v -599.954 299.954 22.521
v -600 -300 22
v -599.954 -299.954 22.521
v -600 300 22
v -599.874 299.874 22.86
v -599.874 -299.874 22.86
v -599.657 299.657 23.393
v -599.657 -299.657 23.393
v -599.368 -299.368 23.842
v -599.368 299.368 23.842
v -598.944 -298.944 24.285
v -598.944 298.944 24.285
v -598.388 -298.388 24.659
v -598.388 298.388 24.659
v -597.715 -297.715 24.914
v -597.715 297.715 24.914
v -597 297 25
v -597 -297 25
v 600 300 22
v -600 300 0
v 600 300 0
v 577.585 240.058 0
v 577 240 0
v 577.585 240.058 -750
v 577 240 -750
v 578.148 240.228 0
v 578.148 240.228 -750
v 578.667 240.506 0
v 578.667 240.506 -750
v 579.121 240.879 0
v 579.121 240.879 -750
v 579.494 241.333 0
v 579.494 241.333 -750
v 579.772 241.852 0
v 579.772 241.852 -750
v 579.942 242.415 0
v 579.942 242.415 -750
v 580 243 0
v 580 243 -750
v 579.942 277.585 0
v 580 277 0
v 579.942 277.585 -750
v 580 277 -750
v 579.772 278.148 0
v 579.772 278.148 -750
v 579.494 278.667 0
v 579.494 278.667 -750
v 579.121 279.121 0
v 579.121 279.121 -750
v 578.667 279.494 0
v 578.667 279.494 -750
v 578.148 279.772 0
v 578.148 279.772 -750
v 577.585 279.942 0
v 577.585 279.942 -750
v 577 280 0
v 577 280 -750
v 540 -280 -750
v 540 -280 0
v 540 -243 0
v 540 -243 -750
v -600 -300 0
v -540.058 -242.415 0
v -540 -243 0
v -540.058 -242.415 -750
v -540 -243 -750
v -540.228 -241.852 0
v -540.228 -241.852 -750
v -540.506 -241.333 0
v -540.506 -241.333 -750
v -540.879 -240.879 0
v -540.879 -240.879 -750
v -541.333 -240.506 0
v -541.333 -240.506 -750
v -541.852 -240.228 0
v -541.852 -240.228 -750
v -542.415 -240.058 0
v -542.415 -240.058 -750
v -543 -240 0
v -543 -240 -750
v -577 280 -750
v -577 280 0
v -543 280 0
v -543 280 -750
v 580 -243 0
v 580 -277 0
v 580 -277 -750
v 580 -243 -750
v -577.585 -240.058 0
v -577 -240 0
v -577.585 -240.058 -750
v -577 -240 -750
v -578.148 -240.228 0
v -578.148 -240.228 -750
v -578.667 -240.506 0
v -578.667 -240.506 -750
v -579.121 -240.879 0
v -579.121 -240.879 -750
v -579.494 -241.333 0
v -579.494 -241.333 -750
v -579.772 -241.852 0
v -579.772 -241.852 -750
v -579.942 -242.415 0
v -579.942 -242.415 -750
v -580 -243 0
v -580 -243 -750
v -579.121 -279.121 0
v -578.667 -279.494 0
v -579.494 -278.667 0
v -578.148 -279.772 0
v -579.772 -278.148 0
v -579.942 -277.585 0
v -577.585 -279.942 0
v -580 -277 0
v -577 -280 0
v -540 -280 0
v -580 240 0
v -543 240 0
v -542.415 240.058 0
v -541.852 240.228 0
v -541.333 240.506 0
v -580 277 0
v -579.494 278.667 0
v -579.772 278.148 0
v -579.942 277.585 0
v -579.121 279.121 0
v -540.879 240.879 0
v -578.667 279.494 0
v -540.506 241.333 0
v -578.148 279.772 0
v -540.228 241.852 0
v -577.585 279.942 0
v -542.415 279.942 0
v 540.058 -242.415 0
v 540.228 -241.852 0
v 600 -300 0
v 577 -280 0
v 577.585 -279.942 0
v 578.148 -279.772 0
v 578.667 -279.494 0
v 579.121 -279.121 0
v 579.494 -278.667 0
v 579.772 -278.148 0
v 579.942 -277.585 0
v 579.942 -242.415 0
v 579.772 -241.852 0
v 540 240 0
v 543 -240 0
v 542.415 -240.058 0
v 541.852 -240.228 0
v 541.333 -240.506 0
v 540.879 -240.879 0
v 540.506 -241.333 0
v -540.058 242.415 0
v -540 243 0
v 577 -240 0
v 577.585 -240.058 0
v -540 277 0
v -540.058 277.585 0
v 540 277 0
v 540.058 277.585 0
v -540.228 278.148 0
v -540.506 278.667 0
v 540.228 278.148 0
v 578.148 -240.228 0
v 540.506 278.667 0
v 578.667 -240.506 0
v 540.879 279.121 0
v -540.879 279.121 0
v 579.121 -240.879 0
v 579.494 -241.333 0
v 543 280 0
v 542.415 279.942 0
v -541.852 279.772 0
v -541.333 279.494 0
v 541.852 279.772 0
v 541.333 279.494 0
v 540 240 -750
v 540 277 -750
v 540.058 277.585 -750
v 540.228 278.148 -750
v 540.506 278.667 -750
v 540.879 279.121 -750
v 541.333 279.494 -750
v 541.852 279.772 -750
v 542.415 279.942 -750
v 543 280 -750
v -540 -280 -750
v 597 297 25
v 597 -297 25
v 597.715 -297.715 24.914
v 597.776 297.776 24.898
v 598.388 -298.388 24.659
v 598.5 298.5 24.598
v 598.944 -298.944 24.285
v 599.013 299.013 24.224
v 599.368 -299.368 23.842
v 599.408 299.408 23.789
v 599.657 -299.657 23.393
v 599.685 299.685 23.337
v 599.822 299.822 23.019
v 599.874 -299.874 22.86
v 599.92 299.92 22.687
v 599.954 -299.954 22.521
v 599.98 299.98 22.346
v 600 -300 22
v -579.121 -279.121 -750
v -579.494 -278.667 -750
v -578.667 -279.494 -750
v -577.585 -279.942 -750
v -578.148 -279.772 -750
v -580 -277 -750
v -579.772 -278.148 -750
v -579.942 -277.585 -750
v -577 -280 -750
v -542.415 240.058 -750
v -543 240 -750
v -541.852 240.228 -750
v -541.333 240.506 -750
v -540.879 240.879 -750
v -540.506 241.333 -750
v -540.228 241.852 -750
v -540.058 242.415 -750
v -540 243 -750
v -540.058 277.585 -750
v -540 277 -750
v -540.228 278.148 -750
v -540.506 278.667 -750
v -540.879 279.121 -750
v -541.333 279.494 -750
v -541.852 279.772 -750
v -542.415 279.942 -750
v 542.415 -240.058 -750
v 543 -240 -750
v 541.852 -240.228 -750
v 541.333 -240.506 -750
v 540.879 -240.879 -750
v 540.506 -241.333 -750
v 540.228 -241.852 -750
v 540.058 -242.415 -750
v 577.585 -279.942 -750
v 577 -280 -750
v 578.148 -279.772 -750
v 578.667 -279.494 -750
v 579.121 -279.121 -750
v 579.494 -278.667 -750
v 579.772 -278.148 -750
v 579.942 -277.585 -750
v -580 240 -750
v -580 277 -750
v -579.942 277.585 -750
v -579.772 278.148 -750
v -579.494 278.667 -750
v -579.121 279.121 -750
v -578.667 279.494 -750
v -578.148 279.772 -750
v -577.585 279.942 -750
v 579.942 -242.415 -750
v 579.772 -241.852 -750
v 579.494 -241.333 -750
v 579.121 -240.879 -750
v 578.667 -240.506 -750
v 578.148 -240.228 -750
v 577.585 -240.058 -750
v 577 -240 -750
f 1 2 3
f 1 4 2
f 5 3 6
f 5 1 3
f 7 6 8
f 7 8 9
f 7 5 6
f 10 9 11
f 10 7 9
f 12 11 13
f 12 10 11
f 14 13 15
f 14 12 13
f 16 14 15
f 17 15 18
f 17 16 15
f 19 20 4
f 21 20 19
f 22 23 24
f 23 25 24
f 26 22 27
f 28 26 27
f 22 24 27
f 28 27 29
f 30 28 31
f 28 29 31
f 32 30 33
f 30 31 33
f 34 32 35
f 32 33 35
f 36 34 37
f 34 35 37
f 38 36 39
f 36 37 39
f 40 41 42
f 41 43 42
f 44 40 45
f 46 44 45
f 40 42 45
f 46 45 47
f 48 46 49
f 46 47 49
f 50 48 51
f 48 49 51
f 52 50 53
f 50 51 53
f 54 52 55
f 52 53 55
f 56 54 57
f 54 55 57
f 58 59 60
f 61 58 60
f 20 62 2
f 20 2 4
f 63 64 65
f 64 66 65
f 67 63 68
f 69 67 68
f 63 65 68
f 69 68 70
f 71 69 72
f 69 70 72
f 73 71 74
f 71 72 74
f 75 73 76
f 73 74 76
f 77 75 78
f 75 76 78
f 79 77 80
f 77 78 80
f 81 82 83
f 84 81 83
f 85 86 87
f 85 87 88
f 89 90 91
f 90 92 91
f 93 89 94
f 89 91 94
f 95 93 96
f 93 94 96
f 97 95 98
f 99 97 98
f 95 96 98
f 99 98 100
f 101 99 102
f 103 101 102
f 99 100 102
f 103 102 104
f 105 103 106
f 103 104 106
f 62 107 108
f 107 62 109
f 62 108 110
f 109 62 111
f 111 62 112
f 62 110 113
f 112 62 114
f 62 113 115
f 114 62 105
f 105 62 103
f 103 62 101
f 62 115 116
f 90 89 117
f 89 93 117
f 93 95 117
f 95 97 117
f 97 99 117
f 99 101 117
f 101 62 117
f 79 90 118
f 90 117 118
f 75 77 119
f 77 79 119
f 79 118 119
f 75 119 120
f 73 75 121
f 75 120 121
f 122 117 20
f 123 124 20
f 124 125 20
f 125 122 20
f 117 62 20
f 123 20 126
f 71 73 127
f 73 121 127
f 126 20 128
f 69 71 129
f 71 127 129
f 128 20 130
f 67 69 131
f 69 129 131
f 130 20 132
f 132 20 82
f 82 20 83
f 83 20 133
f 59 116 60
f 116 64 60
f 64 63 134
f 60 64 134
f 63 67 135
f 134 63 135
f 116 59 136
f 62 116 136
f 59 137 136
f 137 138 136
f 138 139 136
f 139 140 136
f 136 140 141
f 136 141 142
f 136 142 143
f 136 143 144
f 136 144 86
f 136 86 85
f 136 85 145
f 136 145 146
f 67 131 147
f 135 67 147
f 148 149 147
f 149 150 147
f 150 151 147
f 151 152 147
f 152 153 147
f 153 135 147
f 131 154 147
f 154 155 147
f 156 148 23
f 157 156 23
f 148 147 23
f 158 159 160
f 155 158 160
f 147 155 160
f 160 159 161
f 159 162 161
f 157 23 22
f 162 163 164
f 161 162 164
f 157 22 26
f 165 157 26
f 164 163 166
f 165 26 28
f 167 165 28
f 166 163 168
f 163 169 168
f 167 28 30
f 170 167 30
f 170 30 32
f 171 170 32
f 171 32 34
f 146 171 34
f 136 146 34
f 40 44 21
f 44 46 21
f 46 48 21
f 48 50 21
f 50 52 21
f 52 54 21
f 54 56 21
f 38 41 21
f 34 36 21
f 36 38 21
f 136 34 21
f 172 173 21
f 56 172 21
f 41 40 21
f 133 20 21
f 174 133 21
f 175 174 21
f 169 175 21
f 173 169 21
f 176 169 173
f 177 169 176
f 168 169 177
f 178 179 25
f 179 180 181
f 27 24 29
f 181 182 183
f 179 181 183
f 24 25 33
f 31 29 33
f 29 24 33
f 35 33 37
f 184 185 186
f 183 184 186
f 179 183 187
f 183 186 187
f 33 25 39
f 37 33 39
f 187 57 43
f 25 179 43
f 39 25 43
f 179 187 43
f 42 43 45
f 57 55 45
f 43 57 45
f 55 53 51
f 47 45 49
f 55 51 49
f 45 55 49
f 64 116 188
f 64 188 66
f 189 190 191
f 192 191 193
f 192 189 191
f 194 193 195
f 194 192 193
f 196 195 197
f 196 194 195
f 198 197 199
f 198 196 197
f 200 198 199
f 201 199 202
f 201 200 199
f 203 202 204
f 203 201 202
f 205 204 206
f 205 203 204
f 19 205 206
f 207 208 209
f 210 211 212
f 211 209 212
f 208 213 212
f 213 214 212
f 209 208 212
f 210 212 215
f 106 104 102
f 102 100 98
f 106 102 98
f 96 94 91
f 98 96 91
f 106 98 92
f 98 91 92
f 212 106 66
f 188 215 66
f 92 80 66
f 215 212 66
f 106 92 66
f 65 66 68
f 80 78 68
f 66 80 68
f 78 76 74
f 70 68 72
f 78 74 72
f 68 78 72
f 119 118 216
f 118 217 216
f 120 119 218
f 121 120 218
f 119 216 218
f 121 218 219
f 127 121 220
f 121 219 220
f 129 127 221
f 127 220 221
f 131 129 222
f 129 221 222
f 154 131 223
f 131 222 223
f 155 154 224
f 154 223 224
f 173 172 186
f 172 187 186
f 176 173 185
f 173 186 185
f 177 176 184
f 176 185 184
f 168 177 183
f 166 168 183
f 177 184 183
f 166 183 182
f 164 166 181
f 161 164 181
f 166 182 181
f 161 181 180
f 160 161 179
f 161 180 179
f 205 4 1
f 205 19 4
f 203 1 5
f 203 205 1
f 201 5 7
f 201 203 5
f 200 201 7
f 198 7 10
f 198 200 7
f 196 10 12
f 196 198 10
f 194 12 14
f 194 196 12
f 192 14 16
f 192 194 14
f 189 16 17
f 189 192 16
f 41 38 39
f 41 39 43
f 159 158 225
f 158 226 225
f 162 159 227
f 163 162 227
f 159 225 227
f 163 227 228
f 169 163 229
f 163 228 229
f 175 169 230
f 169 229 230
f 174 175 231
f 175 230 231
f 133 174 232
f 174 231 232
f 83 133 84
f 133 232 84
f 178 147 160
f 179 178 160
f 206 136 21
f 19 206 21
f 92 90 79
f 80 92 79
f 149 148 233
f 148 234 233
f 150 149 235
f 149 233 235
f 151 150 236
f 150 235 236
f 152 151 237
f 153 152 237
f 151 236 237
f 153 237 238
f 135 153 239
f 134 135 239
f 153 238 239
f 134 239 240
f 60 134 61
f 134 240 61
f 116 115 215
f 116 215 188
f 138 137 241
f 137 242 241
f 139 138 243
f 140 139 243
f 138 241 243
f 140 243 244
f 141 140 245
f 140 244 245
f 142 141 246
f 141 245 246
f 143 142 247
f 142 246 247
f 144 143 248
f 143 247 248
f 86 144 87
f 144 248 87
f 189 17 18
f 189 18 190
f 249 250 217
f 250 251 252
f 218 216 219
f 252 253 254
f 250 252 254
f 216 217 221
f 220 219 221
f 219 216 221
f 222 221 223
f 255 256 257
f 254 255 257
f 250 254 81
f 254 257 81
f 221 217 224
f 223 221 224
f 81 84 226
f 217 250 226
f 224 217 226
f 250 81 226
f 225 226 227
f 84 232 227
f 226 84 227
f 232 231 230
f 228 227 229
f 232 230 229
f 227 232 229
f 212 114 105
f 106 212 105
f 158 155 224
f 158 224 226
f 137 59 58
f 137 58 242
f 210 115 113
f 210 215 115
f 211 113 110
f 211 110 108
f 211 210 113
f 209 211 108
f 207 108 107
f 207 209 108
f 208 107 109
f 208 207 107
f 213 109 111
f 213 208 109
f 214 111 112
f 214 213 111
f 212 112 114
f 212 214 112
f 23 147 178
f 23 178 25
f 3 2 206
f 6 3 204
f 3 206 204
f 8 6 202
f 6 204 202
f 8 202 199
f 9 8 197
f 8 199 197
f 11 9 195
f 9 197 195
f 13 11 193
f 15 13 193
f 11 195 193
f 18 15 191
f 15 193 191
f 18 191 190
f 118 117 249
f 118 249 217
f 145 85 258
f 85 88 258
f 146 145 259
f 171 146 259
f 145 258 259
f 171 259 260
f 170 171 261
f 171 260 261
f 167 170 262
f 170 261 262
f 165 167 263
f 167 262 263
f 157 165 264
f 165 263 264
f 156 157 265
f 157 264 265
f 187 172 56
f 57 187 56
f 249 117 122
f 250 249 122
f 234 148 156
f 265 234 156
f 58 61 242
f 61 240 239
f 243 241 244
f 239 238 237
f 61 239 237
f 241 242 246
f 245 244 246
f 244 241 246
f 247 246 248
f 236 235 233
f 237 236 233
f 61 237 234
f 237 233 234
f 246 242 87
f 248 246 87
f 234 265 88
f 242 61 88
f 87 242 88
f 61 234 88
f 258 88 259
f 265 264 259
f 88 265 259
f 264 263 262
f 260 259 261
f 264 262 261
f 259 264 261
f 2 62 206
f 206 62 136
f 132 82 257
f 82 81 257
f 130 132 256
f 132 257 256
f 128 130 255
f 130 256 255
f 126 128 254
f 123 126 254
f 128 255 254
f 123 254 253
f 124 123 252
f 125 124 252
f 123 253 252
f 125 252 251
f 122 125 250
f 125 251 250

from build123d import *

# Parameters (mm, degrees)
SKETCH1_W           = 1200
SKETCH1_H           = 600
BOSS_EXTRUDE1_DEPTH = 25
SKETCH2_W           = 40
SKETCH2_H           = 40
BOSS_EXTRUDE2_DEPTH = 750
FILLET1_R           = 3


with BuildPart() as part:
    # Sketch1 → Boss-Extrude1 (new body)
    with BuildSketch(Plane.XY):
        Rectangle(SKETCH1_W, SKETCH1_H)
    extrude(amount=BOSS_EXTRUDE1_DEPTH)

    # Sketch2 → Boss-Extrude2 (add)
    with BuildSketch(Plane.XY):
        with Locations((-560, 260)):
            Rectangle(SKETCH2_W, SKETCH2_H)
        with Locations((560, 260)):
            Rectangle(SKETCH2_W, SKETCH2_H)
        with Locations((-560, -260)):
            Rectangle(SKETCH2_W, SKETCH2_H)
        with Locations((560, -260)):
            Rectangle(SKETCH2_W, SKETCH2_H)
    extrude(amount=-BOSS_EXTRUDE2_DEPTH)

    # Fillet1
    fillet1_edges = [part.edges().sort_by_distance(p)[0] for p in [
        (-600, 0, 25),
        (0, -300, 25),
        (580, 280, -375),
        (580, 240, -375),
        (540, 280, -375),
        (-540, -240, -375),
        (-580, -280, -375),
        (-580, -240, -375),
        (580, -240, -375),
        (580, -280, -375),
        (540, -240, -375),
        (-540, 280, -375),
        (-540, 240, -375),
        (-580, 280, -375),
        (600, 0, 25),
        (0, 300, 25),
    ]]
    fillet(fillet1_edges, radius=FILLET1_R)


solid = part.part
